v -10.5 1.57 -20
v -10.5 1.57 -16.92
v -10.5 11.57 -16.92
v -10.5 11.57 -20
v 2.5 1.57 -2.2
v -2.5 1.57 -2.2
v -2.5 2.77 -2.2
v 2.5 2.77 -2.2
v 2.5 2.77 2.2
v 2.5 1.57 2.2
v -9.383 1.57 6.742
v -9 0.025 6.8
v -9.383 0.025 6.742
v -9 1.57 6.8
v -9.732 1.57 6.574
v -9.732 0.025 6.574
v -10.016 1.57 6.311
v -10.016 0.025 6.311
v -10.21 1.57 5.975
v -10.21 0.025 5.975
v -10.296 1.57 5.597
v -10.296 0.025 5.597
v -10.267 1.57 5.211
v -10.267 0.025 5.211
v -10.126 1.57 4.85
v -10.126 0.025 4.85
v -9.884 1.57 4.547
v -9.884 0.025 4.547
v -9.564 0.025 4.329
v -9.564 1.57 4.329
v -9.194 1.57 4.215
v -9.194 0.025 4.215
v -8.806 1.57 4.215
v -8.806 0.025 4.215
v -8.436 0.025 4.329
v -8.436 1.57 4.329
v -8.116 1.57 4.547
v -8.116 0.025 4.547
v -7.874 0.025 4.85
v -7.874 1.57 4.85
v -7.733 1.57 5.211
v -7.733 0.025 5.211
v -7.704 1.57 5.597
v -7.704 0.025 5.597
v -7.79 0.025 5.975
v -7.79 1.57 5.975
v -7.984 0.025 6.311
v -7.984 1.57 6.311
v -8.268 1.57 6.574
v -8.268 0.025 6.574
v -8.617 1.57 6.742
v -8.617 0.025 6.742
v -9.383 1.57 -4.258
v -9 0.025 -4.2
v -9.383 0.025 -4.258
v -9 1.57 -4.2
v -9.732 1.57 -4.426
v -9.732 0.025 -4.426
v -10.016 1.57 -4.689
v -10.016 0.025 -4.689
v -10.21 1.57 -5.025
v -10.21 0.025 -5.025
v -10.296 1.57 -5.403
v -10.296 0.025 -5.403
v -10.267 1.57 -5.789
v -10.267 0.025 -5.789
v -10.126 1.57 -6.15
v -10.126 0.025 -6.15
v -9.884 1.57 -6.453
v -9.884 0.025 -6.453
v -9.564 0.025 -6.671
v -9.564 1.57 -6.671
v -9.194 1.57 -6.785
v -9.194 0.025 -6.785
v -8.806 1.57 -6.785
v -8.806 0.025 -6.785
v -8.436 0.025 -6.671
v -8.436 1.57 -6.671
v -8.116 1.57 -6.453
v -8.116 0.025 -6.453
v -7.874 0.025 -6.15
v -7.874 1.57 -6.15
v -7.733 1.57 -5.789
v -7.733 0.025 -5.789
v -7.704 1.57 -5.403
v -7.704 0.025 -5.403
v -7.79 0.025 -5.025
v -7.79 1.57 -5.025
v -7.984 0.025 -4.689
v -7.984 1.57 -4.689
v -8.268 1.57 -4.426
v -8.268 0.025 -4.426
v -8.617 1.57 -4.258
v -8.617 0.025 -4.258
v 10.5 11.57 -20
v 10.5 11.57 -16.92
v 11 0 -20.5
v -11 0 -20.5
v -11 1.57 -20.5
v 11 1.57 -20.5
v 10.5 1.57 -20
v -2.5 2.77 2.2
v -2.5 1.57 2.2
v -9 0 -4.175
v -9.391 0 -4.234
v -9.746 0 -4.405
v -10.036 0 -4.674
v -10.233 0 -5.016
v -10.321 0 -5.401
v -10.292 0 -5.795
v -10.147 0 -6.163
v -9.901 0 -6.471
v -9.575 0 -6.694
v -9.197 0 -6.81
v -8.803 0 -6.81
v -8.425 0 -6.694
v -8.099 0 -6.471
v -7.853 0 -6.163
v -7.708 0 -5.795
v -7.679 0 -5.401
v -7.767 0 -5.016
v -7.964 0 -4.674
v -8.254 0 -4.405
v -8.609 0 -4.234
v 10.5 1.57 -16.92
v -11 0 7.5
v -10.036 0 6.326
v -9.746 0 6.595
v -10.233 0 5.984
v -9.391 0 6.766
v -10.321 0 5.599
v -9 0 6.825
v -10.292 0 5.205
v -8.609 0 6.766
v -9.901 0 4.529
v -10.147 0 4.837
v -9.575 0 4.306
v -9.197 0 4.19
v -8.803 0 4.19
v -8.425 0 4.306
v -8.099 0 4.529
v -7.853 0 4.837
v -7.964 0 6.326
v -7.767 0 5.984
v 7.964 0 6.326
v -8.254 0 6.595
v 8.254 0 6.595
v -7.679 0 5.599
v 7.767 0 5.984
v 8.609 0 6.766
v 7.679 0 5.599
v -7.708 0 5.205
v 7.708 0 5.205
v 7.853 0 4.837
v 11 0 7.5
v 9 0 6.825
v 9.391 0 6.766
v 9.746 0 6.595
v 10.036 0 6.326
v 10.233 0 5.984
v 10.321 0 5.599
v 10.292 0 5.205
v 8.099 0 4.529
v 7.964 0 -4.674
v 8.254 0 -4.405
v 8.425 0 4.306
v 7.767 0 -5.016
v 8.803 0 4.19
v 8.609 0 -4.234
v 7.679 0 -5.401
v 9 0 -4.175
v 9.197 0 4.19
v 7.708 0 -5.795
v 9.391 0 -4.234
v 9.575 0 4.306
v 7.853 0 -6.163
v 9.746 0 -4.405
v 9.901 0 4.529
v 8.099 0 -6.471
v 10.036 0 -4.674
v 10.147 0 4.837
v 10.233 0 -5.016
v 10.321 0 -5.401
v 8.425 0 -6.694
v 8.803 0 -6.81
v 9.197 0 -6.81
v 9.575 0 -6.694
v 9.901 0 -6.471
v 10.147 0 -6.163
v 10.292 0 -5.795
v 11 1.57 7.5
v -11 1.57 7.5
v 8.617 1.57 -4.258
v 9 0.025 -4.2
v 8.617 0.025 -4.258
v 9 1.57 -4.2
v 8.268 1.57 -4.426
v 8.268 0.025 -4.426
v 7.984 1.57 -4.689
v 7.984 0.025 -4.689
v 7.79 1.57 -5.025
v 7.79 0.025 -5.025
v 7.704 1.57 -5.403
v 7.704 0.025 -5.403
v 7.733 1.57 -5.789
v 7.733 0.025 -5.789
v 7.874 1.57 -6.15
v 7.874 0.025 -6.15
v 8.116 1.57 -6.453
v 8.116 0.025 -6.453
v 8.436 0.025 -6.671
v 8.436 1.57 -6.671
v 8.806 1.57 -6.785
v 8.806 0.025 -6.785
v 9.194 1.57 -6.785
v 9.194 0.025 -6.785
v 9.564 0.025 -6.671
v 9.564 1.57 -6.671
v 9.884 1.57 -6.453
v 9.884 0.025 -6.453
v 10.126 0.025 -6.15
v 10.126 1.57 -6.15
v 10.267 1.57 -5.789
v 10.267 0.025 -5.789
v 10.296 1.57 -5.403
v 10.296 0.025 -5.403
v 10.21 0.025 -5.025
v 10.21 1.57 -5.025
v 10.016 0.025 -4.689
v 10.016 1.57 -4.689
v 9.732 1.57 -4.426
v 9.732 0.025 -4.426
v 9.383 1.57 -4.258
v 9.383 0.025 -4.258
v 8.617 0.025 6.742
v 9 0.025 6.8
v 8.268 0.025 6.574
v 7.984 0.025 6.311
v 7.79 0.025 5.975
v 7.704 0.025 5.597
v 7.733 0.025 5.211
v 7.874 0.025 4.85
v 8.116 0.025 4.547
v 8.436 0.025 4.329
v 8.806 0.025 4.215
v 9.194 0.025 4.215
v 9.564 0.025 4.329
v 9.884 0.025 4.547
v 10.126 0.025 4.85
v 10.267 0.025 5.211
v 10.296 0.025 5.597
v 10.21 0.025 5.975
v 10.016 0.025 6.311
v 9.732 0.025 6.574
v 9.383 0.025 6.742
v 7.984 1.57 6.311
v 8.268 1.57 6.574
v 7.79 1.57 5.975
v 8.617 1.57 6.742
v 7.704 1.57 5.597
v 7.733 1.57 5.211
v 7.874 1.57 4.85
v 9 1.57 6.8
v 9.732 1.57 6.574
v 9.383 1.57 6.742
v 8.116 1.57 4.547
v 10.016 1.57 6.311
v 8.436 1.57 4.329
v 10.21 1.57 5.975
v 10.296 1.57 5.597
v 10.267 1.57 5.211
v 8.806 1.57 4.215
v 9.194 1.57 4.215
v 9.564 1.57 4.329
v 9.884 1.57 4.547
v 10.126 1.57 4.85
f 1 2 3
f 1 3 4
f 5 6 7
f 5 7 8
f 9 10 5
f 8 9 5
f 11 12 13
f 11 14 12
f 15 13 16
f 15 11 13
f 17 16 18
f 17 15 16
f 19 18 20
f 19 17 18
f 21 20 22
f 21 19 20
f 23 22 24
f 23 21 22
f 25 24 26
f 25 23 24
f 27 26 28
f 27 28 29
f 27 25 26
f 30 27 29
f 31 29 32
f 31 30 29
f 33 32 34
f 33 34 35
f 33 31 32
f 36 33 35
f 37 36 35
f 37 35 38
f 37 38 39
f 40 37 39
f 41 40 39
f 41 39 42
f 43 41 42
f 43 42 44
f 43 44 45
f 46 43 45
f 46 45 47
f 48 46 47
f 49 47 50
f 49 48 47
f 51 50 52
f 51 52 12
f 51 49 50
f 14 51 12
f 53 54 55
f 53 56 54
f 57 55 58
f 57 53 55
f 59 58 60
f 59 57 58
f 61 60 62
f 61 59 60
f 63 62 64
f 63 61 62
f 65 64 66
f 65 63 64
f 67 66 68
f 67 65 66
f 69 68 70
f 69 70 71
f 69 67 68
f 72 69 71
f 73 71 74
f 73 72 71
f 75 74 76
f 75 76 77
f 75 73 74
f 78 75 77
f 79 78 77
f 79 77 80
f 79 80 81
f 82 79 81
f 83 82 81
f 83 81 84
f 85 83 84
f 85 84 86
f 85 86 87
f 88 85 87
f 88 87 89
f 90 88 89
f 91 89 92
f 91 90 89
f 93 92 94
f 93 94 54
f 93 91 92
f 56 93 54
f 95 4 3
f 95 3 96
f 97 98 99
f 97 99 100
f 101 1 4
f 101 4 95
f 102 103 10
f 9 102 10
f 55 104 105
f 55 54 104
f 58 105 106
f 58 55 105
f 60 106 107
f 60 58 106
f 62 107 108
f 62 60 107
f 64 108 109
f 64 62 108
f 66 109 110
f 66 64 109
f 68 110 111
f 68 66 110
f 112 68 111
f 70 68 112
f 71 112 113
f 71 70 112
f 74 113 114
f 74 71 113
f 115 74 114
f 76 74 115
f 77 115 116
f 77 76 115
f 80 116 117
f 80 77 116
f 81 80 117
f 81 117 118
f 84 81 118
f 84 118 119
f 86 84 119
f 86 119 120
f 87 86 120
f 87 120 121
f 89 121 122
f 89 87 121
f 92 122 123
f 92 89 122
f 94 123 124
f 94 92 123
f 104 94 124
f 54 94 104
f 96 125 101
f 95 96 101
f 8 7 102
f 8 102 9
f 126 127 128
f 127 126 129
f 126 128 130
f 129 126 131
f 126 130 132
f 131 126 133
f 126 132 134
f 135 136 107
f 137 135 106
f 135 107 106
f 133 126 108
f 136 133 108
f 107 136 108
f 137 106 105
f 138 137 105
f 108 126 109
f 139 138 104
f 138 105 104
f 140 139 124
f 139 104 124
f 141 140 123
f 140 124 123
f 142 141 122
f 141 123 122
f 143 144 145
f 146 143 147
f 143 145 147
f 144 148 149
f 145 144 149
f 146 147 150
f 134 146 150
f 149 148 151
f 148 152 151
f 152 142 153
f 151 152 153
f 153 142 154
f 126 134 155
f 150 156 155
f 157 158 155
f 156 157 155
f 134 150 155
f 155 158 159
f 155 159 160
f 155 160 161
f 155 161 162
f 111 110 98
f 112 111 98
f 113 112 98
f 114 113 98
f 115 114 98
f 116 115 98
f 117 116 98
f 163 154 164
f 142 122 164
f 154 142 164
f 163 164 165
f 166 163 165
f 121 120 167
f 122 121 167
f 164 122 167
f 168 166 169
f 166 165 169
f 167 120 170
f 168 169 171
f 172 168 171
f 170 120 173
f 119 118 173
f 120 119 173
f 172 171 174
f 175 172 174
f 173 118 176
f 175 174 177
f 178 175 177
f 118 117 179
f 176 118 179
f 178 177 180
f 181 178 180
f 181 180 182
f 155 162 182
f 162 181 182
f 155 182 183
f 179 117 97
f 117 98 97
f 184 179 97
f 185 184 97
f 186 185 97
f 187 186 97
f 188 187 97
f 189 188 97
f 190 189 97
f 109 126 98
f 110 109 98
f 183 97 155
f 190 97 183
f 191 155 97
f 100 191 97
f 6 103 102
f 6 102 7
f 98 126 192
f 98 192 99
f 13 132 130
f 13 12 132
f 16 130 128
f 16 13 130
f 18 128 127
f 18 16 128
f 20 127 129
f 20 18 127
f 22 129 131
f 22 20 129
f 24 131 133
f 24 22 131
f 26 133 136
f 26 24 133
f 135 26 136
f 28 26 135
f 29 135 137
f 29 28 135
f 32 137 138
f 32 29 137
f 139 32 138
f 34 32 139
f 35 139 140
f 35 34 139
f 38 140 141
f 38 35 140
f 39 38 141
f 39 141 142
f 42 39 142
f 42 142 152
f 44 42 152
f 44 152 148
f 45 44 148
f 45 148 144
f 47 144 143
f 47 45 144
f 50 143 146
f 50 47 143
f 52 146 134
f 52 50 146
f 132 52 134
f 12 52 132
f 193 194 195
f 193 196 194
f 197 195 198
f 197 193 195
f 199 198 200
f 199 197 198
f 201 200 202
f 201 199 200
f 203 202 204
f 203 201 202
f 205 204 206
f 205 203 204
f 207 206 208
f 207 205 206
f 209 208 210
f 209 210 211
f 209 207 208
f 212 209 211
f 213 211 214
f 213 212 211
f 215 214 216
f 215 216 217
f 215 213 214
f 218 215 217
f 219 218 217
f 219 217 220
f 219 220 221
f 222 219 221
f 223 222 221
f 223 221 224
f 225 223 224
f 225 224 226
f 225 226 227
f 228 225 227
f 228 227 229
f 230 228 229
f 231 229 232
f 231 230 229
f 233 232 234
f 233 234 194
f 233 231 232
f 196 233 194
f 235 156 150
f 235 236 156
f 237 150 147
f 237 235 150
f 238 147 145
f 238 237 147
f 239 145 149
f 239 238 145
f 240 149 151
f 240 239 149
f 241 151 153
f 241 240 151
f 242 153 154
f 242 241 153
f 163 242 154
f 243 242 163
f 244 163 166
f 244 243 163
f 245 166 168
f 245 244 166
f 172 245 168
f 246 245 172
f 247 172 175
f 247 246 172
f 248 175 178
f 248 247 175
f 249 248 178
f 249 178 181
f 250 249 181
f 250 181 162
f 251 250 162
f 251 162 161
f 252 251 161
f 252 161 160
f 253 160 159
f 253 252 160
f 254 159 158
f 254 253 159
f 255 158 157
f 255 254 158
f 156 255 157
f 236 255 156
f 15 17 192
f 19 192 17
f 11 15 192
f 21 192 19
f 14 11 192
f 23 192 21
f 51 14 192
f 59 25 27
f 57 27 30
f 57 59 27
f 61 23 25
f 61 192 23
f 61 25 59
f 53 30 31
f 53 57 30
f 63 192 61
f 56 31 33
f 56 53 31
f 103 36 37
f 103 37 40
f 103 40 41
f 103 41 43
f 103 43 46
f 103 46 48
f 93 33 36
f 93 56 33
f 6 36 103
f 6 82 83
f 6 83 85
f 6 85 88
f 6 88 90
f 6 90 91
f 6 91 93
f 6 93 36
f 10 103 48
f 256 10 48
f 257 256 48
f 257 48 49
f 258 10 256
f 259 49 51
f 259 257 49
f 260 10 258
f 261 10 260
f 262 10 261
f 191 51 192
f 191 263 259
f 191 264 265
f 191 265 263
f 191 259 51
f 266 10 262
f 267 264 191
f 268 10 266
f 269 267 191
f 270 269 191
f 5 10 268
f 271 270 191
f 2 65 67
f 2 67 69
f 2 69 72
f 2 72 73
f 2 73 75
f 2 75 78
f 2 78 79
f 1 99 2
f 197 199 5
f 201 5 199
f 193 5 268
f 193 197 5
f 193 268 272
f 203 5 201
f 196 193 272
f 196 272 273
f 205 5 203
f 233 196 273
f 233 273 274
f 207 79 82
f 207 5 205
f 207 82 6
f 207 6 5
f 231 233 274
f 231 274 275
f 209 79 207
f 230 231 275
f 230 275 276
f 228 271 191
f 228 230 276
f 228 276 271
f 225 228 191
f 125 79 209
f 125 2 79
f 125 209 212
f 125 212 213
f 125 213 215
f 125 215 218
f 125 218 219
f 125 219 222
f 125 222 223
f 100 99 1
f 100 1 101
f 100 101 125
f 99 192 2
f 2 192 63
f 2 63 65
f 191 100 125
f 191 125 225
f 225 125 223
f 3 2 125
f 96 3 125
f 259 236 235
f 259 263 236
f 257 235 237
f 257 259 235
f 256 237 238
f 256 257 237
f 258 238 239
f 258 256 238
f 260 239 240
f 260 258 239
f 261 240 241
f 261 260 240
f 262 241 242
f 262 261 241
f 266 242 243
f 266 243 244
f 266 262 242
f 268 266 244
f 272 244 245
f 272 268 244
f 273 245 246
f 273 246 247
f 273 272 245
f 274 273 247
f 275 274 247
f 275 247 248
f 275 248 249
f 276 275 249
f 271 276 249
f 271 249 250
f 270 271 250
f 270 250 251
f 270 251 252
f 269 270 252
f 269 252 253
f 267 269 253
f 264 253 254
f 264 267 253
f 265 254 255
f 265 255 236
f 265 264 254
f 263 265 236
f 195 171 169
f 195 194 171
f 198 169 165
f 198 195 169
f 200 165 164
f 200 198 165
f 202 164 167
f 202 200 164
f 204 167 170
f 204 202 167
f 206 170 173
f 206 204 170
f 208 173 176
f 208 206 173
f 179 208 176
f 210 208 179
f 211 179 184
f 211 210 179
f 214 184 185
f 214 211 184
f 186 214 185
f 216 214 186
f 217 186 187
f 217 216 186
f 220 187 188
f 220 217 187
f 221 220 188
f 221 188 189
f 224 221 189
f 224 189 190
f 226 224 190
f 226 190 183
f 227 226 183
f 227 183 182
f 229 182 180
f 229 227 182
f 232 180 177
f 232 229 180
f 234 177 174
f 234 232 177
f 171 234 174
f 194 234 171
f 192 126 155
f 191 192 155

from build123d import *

# Parameters (mm, degrees)
SKETCH1_W                           = 22
SKETCH1_H                           = 28
BOSS_EXTRUDE1_DEPTH                 = 1.57
F_2_6_2_6_DIAMETER_HOLE1_AT_2_COUNT = 2
F_2_6_2_6_DIAMETER_HOLE1_AT_2_PITCH = 11
F_2_6_2_6_DIAMETER_HOLE1_AT_3_COUNT = 2
F_2_6_2_6_DIAMETER_HOLE1_AT_3_PITCH = 21.09502311
F_2_6_2_6_DIAMETER_HOLE1_AT_4_COUNT = 2
F_2_6_2_6_DIAMETER_HOLE1_AT_4_PITCH = 18
SKETCH5_W                           = 5
SKETCH5_H                           = 4.4
BOSS_EXTRUDE2_DEPTH                 = 1.2
SKETCH6_W                           = 21
SKETCH6_H                           = 3.08
BOSS_EXTRUDE3_DEPTH                 = 10


with BuildPart() as part:
    # Sketch1 → Boss-Extrude1 (new body)
    with BuildSketch(Plane(origin=(0, 0, 0), x_dir=(1, 0, 0), z_dir=(0, 1, 0))):
        with Locations((0, 6.5)):
            Rectangle(SKETCH1_W, SKETCH1_H)
    extrude(amount=BOSS_EXTRUDE1_DEPTH)

    # Sketch3 → Ø2.6 (2.6) Diameter Hole1 (revolve, cut)
    with BuildSketch(Plane(origin=(-9, 1.57, -5.5), x_dir=(0, 0, 1), z_dir=(1, 0, 0))):
        Polygon((0, 0), (0, 1.57), (1.325, 1.57), (1.3, 1.545), (1.3, 0), align=None)
    f_2_6_2_6_diameter_hole1 = revolve(axis=Axis((-9, 7.92, -5.5), (0, -1, 0)), mode=Mode.SUBTRACT)

    # Ø2.6 (2.6) Diameter Hole1 at 2: Ø2.6 (2.6) Diameter Hole1 ×2
    with Locations(*[(0, 0, i * F_2_6_2_6_DIAMETER_HOLE1_AT_2_PITCH) for i in range(1, F_2_6_2_6_DIAMETER_HOLE1_AT_2_COUNT)]):
        add(f_2_6_2_6_diameter_hole1, mode=Mode.SUBTRACT)

    # Ø2.6 (2.6) Diameter Hole1 at 3: Ø2.6 (2.6) Diameter Hole1 ×2
    with Locations(*[Vector(0.853281834, 0, 0.521450009) * (i * F_2_6_2_6_DIAMETER_HOLE1_AT_3_PITCH) for i in range(1, F_2_6_2_6_DIAMETER_HOLE1_AT_3_COUNT)]):
        add(f_2_6_2_6_diameter_hole1, mode=Mode.SUBTRACT)

    # Ø2.6 (2.6) Diameter Hole1 at 4: Ø2.6 (2.6) Diameter Hole1 ×2
    with Locations(*[(i * F_2_6_2_6_DIAMETER_HOLE1_AT_4_PITCH, 0, 0) for i in range(1, F_2_6_2_6_DIAMETER_HOLE1_AT_4_COUNT)]):
        add(f_2_6_2_6_diameter_hole1, mode=Mode.SUBTRACT)

    # Sketch5 → Boss-Extrude2 (add)
    with BuildSketch(Plane(origin=(0, 1.57, 0), x_dir=(1, 0, 0), z_dir=(0, 1, 0))):
        Rectangle(SKETCH5_W, SKETCH5_H)
    extrude(amount=BOSS_EXTRUDE2_DEPTH)

    # Sketch6 → Boss-Extrude3 (add)
    with BuildSketch(Plane(origin=(0, 1.57, 0), x_dir=(1, 0, 0), z_dir=(0, 1, 0))):
        with Locations((0, 18.46)):
            Rectangle(SKETCH6_W, SKETCH6_H)
    extrude(amount=BOSS_EXTRUDE3_DEPTH)


solid = part.part
